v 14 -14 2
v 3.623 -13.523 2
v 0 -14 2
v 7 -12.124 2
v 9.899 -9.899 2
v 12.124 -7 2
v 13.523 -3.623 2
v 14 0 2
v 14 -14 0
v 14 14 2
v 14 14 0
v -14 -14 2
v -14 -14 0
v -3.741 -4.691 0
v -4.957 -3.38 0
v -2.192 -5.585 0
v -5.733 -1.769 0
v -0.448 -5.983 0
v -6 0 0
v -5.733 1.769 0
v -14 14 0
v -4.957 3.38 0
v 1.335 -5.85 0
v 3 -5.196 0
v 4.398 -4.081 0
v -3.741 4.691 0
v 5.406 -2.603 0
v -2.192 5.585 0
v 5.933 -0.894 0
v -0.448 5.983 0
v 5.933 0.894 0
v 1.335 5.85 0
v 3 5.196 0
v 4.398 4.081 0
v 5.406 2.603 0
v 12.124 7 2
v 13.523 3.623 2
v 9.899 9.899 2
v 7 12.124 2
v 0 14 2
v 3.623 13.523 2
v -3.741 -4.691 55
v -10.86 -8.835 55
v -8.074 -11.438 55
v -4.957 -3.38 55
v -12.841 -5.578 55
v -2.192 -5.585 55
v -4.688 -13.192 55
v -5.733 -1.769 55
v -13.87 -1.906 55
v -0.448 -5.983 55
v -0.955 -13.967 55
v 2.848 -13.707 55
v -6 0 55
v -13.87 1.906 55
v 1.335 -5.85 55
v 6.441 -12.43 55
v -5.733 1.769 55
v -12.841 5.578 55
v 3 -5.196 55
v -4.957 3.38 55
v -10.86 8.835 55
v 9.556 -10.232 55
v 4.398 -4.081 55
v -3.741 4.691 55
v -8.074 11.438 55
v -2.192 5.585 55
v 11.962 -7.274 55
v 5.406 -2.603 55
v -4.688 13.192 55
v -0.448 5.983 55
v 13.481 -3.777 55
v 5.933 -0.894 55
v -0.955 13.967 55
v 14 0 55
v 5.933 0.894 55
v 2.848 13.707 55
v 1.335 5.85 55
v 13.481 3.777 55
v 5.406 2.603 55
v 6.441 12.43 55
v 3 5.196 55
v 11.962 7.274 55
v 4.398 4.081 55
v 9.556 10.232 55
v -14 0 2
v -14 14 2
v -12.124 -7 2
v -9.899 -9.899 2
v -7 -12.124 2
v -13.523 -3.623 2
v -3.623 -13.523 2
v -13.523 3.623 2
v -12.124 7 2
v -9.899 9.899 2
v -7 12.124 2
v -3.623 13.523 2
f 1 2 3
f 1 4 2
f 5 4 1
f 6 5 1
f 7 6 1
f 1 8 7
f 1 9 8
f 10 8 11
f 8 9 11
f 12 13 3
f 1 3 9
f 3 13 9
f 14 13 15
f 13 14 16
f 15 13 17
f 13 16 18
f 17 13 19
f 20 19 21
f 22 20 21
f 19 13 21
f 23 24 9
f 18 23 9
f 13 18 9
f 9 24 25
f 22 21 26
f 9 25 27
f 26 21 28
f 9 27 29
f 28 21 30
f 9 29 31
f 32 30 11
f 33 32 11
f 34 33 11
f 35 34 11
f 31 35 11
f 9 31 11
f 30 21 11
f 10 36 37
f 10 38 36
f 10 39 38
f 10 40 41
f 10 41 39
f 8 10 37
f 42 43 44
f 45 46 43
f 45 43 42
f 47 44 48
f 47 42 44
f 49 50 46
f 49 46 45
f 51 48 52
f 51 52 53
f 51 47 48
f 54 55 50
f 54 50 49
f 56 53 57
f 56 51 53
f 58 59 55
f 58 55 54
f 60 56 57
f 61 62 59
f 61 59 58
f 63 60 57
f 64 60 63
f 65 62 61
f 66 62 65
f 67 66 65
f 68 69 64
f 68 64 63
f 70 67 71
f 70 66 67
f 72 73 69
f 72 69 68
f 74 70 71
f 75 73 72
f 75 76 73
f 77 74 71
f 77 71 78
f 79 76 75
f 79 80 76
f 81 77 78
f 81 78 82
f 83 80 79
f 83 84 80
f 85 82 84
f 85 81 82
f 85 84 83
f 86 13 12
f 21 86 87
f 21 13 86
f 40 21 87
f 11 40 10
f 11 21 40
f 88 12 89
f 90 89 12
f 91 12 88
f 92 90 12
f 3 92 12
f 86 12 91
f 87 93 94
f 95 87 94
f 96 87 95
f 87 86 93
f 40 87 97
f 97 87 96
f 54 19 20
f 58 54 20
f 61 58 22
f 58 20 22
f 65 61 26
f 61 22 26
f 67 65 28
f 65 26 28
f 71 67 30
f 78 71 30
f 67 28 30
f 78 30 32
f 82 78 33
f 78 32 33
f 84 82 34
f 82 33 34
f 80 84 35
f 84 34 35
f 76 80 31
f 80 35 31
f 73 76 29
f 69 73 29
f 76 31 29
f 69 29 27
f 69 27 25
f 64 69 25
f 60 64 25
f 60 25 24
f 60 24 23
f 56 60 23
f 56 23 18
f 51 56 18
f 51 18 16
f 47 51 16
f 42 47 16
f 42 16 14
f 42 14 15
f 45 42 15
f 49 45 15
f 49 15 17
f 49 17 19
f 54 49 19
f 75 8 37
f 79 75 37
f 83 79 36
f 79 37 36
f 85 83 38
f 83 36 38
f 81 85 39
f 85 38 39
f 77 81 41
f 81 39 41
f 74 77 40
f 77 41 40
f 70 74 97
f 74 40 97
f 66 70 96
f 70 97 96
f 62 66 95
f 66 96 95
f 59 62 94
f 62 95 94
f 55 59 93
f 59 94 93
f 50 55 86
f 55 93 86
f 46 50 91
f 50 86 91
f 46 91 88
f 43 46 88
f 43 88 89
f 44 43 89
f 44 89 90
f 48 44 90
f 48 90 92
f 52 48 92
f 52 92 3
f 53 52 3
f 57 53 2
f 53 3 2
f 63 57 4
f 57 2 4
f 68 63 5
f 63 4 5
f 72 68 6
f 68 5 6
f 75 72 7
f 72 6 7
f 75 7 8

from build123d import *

# Parameters (mm, degrees)
SKETCH1_W           = 28
SKETCH1_H           = 28
BOSS_EXTRUDE1_DEPTH = 2
SKETCH2_R           = 14
BOSS_EXTRUDE2_DEPTH = 53
SKETCH3_R           = 6
CUT_EXTRUDE1_DEPTH  = 56


with BuildPart() as part:
    # Sketch1 → Boss-Extrude1 (new body)
    with BuildSketch(Plane.XY):
        Rectangle(SKETCH1_W, SKETCH1_H)
    extrude(amount=BOSS_EXTRUDE1_DEPTH)

    # Sketch2 → Boss-Extrude2 (add)
    with BuildSketch(Plane.XY.offset(2)):
        Circle(SKETCH2_R)
    extrude(amount=BOSS_EXTRUDE2_DEPTH)

    # Sketch3 → Cut-Extrude1 (cut, through all)
    with BuildSketch(Plane(origin=(0, 0, 0), x_dir=(-1, 0, 0), z_dir=(0, 0, -1))):
        Circle(SKETCH3_R)
    extrude(amount=-CUT_EXTRUDE1_DEPTH, mode=Mode.SUBTRACT)


solid = part.part
